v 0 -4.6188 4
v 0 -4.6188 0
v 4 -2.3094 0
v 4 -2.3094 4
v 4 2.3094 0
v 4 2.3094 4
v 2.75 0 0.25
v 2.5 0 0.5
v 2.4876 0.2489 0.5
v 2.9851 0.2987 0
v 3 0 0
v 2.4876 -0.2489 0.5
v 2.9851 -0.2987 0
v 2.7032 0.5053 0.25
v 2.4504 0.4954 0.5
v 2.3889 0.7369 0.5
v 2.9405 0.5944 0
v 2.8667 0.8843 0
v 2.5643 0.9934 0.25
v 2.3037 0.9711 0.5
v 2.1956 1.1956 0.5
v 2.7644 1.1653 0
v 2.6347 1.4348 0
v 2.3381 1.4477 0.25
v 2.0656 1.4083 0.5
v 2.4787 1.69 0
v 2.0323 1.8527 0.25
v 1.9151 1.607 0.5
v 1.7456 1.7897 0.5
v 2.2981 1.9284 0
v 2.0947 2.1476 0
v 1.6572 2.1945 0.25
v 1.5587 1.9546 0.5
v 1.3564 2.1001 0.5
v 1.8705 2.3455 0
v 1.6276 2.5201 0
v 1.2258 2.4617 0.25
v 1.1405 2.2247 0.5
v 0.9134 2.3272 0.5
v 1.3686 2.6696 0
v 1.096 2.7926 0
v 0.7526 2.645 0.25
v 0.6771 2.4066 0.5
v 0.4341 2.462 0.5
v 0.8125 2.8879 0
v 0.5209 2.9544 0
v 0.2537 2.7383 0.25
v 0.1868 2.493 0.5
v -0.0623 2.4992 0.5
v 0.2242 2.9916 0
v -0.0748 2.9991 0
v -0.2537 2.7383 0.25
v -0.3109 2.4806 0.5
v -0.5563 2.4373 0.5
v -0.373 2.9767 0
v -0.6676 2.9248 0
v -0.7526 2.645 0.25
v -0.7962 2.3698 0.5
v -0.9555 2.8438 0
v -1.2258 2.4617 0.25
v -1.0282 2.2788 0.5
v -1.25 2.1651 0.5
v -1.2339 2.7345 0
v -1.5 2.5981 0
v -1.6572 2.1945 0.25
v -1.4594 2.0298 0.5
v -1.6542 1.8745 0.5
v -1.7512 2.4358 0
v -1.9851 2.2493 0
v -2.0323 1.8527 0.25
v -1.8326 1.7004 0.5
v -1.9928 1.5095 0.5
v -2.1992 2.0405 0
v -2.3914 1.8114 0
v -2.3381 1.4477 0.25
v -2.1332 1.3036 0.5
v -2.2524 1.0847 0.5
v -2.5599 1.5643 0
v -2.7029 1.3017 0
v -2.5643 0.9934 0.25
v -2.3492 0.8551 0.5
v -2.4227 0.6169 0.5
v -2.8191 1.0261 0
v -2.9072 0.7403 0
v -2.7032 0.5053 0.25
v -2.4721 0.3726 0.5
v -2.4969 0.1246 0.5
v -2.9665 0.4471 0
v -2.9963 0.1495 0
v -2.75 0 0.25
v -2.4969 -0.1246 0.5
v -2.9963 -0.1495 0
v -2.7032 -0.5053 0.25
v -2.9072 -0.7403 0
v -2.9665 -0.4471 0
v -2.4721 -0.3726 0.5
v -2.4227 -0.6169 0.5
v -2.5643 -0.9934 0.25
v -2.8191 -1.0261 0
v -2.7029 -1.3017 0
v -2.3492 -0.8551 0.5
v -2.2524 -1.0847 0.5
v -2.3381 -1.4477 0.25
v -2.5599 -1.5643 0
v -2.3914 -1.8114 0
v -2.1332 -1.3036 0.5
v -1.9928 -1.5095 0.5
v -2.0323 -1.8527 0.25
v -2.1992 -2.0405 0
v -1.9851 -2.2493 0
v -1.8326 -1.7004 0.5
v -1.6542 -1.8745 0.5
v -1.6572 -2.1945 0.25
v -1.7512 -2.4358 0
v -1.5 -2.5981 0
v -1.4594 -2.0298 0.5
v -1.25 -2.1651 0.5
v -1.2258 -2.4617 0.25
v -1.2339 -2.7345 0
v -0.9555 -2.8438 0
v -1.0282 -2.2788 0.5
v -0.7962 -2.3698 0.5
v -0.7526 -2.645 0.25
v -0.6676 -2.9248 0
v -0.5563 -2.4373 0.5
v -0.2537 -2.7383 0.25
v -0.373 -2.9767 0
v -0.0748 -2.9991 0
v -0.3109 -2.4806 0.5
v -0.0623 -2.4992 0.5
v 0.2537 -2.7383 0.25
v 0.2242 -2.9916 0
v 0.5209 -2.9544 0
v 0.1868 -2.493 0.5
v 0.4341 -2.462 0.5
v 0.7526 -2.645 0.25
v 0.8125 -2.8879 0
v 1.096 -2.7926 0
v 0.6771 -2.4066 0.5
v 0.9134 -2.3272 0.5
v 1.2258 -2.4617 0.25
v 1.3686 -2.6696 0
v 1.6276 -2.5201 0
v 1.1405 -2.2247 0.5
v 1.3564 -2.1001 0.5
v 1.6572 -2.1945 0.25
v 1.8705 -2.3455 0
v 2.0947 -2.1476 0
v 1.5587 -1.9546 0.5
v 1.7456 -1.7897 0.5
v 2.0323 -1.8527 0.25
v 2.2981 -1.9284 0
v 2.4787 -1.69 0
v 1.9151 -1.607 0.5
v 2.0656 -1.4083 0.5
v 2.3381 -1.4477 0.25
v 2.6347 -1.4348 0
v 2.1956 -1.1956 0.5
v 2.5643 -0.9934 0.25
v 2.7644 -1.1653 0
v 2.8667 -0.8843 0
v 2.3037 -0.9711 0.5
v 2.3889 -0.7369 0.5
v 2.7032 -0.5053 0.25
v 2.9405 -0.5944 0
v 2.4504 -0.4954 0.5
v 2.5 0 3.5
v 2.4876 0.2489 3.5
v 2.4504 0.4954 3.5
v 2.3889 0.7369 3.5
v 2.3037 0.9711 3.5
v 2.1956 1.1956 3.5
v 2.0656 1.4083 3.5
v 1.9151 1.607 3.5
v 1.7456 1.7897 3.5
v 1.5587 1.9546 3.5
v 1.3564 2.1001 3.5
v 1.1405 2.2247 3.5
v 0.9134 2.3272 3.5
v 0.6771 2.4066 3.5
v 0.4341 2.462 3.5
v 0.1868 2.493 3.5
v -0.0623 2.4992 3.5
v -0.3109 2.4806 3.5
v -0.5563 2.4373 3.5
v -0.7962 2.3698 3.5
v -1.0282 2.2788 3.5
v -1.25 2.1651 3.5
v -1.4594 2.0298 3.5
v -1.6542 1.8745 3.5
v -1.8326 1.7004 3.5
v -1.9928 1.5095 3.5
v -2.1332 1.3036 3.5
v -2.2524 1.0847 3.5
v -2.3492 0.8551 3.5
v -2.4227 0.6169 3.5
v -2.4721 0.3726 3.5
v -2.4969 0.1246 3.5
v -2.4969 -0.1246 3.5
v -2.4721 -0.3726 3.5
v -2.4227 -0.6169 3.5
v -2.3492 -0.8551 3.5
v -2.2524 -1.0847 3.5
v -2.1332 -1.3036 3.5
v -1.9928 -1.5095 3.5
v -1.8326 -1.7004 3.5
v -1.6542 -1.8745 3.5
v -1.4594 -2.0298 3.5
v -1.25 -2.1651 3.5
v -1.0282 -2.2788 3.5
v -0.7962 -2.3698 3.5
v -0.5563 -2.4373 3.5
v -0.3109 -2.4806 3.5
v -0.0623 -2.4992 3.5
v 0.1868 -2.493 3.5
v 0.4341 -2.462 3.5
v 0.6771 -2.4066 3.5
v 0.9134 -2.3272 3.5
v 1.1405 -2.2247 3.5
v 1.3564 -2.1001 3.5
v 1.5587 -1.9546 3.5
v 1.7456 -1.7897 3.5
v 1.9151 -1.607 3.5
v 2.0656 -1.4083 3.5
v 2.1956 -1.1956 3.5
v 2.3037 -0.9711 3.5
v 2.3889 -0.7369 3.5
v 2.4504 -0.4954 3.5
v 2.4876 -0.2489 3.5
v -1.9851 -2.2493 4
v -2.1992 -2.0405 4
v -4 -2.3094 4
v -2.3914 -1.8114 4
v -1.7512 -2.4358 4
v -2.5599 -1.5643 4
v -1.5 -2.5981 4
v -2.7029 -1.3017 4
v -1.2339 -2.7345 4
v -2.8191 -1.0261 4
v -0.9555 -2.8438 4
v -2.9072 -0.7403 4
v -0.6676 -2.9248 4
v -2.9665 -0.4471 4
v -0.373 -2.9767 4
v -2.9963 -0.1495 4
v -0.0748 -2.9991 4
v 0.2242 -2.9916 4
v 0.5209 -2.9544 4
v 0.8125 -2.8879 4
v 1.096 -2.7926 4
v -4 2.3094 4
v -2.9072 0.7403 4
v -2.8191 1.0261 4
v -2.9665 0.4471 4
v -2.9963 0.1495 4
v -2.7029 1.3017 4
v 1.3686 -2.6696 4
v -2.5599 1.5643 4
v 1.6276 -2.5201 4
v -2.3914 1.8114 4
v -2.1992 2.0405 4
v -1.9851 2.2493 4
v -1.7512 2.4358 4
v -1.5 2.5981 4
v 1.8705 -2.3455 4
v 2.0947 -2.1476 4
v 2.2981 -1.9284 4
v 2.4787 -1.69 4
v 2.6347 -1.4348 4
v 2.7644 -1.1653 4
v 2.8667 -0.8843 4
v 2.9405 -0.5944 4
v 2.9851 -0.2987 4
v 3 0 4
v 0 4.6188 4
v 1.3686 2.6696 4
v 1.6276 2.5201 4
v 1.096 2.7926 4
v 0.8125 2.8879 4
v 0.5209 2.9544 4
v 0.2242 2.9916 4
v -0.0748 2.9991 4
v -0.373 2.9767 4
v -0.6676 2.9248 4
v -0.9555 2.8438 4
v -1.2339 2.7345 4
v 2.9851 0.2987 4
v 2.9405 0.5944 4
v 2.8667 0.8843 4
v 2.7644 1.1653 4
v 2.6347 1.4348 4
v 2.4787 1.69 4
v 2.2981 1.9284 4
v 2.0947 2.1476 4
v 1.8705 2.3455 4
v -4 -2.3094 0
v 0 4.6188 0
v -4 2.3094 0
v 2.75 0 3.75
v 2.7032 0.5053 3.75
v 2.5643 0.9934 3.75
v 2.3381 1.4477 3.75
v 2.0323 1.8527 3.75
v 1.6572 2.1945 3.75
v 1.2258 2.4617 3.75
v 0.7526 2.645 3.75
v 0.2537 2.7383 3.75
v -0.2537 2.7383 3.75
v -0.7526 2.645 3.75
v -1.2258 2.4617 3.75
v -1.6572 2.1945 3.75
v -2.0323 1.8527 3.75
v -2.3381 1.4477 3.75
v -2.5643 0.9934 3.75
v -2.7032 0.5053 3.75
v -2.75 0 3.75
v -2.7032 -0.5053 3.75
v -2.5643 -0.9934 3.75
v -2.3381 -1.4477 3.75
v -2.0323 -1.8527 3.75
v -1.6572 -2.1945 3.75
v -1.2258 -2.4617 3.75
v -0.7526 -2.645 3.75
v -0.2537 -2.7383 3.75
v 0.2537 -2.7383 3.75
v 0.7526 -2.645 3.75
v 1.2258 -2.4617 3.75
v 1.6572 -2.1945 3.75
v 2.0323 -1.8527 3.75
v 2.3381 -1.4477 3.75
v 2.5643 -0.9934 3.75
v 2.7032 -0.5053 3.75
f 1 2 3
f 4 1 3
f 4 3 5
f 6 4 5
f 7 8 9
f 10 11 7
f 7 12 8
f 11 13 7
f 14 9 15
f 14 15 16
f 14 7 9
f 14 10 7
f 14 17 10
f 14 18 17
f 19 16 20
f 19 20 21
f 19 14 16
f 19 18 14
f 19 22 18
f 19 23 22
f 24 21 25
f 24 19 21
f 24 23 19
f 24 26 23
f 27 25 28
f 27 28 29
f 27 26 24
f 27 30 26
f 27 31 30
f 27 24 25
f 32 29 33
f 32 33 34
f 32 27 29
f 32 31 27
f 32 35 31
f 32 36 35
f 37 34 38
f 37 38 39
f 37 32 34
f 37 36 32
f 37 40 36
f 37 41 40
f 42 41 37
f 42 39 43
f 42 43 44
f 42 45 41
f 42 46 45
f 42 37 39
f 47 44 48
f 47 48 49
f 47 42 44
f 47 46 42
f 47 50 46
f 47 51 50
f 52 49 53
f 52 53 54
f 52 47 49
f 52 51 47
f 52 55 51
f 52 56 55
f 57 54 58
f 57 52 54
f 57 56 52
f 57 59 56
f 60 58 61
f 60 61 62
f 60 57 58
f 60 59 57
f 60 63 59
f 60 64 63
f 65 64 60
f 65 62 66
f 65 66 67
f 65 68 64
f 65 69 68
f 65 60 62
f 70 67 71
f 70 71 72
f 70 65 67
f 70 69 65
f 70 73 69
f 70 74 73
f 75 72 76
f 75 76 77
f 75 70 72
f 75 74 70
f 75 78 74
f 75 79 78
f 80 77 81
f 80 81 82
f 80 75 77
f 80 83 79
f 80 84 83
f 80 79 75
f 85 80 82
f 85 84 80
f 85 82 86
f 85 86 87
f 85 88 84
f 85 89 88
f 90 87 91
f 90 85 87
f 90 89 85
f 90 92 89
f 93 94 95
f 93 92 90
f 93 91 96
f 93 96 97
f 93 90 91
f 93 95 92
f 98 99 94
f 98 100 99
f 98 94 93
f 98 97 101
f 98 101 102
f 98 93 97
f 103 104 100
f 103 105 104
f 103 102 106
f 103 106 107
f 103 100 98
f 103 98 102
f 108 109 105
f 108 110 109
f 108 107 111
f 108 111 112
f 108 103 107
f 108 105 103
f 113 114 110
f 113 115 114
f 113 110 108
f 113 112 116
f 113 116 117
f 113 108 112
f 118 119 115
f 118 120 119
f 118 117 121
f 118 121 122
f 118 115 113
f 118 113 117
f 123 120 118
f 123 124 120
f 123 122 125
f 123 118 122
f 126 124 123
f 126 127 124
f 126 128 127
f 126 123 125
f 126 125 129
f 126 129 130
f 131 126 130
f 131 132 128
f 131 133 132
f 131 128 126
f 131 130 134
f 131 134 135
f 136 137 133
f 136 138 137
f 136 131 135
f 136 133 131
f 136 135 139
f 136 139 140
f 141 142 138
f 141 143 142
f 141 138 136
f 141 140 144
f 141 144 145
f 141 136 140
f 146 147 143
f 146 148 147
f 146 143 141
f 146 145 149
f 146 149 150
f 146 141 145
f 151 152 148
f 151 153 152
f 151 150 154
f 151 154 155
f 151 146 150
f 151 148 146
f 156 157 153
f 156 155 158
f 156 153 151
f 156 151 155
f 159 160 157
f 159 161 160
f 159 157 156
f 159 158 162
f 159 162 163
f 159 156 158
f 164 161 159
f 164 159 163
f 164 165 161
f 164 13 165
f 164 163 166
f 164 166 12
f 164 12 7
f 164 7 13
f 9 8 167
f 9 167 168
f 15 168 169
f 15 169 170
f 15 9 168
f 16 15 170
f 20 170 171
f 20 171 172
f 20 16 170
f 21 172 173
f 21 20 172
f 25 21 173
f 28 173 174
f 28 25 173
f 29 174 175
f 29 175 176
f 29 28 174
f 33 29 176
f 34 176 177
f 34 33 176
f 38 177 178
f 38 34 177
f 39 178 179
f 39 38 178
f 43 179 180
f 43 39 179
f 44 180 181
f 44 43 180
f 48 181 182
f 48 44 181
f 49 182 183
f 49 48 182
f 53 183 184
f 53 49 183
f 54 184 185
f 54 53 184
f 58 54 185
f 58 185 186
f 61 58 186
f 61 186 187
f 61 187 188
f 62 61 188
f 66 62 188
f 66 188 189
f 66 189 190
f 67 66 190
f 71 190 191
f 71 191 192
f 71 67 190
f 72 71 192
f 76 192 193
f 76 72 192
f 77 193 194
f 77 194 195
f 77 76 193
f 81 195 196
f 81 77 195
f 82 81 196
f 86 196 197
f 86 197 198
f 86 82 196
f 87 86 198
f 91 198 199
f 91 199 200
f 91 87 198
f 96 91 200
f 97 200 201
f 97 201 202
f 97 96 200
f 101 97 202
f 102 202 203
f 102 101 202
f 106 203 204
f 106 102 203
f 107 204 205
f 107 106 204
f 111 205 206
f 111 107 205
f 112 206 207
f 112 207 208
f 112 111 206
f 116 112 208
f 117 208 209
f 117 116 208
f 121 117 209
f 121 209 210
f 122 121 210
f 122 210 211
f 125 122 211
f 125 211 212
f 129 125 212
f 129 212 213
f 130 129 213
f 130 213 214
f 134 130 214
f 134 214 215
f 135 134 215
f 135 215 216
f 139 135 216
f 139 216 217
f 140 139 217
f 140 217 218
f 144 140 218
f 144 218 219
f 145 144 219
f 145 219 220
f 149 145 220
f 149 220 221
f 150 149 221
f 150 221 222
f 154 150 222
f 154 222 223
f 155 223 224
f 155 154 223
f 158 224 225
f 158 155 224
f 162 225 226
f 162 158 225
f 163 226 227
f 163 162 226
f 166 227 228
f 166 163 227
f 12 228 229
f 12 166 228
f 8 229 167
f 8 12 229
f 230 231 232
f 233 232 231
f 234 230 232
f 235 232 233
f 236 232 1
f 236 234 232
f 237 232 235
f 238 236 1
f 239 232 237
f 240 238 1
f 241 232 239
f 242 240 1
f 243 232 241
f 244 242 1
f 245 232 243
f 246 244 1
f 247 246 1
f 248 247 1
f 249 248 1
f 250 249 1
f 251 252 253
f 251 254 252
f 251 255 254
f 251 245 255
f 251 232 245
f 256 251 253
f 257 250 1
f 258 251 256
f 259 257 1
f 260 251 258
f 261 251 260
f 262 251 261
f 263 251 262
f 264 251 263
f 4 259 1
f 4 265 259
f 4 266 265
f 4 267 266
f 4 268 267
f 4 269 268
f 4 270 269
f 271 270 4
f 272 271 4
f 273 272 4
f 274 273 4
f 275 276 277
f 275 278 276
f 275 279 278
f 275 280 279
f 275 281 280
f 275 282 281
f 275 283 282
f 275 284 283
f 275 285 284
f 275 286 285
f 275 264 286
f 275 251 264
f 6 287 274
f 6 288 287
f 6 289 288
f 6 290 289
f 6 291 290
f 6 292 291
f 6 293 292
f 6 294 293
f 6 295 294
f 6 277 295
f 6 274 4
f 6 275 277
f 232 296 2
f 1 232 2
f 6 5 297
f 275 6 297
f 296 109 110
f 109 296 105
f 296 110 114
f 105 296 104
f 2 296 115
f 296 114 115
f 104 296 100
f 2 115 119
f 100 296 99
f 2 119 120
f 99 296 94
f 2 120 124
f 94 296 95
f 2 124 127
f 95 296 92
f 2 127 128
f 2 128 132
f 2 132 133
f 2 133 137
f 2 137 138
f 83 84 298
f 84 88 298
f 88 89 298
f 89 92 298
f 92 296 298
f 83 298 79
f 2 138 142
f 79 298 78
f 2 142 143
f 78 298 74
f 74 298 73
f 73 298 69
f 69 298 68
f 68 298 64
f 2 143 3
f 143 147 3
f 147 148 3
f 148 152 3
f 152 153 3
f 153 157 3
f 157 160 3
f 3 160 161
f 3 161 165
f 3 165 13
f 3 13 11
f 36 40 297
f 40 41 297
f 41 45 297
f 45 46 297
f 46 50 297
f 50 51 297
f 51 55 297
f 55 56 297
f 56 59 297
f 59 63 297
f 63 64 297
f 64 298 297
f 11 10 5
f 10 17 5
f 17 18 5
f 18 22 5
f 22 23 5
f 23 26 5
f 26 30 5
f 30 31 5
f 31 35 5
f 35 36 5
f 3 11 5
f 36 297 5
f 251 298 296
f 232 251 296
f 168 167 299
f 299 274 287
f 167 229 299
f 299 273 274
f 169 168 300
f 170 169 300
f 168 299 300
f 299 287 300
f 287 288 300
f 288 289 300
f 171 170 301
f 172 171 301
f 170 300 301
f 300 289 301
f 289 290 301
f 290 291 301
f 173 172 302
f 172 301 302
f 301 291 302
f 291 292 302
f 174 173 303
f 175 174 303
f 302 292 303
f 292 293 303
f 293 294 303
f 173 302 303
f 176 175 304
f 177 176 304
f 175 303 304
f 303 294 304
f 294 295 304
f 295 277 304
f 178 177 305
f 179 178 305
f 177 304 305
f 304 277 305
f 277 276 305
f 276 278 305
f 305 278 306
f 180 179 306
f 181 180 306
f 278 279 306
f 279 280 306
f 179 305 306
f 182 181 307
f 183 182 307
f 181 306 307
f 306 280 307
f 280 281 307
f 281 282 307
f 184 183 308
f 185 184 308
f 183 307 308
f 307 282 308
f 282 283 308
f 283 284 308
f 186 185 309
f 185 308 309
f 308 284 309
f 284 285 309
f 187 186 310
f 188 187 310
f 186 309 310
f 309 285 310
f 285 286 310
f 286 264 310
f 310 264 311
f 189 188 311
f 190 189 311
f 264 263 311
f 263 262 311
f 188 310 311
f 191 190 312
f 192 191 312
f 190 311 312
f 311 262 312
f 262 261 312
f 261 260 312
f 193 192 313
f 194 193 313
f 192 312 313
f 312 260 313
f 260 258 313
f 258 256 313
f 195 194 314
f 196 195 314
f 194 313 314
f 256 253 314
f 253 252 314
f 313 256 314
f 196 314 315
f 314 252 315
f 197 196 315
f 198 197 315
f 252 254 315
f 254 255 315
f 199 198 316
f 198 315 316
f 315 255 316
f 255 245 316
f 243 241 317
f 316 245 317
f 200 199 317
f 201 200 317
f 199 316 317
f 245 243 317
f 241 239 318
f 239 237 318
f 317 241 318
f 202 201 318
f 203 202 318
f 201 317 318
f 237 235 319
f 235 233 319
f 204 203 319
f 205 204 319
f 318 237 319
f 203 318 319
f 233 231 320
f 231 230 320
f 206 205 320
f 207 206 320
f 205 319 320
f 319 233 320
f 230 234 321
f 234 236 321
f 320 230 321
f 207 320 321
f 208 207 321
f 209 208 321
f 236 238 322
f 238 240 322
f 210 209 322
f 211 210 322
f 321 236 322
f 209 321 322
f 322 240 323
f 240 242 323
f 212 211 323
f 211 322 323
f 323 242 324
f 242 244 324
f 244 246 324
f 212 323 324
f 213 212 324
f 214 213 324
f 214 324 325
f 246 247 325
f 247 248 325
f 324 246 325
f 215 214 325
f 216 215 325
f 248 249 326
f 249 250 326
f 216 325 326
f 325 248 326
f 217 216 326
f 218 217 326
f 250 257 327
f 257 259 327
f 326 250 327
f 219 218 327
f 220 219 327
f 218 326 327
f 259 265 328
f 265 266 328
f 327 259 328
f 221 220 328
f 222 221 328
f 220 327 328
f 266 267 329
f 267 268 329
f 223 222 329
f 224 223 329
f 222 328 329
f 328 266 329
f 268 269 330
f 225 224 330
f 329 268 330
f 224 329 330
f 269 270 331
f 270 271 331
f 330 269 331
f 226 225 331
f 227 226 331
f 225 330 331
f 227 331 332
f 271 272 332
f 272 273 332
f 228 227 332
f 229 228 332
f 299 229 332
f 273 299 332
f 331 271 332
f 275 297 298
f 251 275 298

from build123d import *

# Parameters (mm, degrees)
F0_R     = 2.5
F1_DEPTH = 4
F2_SIZE  = 0.5


with BuildPart() as f1:
    # F0 (on Top) → F1 (new body)
    with BuildSketch(Plane.XY):
        Polygon((4, -2.309401), (4, 2.309401), (0, 4.618802), (-4, 2.309401), (-4, -2.309401), (0, -4.618802), align=None)
        Circle(F0_R, mode=Mode.SUBTRACT)
    extrude(amount=F1_DEPTH)

    # F2
    f2_edges = [f1.edges().sort_by_distance(p)[0] for p in [
        (-2.5, 0, 4),
        (-2.5, 0, 0),
    ]]
    chamfer(f2_edges, length=F2_SIZE)


solid = f1.part
